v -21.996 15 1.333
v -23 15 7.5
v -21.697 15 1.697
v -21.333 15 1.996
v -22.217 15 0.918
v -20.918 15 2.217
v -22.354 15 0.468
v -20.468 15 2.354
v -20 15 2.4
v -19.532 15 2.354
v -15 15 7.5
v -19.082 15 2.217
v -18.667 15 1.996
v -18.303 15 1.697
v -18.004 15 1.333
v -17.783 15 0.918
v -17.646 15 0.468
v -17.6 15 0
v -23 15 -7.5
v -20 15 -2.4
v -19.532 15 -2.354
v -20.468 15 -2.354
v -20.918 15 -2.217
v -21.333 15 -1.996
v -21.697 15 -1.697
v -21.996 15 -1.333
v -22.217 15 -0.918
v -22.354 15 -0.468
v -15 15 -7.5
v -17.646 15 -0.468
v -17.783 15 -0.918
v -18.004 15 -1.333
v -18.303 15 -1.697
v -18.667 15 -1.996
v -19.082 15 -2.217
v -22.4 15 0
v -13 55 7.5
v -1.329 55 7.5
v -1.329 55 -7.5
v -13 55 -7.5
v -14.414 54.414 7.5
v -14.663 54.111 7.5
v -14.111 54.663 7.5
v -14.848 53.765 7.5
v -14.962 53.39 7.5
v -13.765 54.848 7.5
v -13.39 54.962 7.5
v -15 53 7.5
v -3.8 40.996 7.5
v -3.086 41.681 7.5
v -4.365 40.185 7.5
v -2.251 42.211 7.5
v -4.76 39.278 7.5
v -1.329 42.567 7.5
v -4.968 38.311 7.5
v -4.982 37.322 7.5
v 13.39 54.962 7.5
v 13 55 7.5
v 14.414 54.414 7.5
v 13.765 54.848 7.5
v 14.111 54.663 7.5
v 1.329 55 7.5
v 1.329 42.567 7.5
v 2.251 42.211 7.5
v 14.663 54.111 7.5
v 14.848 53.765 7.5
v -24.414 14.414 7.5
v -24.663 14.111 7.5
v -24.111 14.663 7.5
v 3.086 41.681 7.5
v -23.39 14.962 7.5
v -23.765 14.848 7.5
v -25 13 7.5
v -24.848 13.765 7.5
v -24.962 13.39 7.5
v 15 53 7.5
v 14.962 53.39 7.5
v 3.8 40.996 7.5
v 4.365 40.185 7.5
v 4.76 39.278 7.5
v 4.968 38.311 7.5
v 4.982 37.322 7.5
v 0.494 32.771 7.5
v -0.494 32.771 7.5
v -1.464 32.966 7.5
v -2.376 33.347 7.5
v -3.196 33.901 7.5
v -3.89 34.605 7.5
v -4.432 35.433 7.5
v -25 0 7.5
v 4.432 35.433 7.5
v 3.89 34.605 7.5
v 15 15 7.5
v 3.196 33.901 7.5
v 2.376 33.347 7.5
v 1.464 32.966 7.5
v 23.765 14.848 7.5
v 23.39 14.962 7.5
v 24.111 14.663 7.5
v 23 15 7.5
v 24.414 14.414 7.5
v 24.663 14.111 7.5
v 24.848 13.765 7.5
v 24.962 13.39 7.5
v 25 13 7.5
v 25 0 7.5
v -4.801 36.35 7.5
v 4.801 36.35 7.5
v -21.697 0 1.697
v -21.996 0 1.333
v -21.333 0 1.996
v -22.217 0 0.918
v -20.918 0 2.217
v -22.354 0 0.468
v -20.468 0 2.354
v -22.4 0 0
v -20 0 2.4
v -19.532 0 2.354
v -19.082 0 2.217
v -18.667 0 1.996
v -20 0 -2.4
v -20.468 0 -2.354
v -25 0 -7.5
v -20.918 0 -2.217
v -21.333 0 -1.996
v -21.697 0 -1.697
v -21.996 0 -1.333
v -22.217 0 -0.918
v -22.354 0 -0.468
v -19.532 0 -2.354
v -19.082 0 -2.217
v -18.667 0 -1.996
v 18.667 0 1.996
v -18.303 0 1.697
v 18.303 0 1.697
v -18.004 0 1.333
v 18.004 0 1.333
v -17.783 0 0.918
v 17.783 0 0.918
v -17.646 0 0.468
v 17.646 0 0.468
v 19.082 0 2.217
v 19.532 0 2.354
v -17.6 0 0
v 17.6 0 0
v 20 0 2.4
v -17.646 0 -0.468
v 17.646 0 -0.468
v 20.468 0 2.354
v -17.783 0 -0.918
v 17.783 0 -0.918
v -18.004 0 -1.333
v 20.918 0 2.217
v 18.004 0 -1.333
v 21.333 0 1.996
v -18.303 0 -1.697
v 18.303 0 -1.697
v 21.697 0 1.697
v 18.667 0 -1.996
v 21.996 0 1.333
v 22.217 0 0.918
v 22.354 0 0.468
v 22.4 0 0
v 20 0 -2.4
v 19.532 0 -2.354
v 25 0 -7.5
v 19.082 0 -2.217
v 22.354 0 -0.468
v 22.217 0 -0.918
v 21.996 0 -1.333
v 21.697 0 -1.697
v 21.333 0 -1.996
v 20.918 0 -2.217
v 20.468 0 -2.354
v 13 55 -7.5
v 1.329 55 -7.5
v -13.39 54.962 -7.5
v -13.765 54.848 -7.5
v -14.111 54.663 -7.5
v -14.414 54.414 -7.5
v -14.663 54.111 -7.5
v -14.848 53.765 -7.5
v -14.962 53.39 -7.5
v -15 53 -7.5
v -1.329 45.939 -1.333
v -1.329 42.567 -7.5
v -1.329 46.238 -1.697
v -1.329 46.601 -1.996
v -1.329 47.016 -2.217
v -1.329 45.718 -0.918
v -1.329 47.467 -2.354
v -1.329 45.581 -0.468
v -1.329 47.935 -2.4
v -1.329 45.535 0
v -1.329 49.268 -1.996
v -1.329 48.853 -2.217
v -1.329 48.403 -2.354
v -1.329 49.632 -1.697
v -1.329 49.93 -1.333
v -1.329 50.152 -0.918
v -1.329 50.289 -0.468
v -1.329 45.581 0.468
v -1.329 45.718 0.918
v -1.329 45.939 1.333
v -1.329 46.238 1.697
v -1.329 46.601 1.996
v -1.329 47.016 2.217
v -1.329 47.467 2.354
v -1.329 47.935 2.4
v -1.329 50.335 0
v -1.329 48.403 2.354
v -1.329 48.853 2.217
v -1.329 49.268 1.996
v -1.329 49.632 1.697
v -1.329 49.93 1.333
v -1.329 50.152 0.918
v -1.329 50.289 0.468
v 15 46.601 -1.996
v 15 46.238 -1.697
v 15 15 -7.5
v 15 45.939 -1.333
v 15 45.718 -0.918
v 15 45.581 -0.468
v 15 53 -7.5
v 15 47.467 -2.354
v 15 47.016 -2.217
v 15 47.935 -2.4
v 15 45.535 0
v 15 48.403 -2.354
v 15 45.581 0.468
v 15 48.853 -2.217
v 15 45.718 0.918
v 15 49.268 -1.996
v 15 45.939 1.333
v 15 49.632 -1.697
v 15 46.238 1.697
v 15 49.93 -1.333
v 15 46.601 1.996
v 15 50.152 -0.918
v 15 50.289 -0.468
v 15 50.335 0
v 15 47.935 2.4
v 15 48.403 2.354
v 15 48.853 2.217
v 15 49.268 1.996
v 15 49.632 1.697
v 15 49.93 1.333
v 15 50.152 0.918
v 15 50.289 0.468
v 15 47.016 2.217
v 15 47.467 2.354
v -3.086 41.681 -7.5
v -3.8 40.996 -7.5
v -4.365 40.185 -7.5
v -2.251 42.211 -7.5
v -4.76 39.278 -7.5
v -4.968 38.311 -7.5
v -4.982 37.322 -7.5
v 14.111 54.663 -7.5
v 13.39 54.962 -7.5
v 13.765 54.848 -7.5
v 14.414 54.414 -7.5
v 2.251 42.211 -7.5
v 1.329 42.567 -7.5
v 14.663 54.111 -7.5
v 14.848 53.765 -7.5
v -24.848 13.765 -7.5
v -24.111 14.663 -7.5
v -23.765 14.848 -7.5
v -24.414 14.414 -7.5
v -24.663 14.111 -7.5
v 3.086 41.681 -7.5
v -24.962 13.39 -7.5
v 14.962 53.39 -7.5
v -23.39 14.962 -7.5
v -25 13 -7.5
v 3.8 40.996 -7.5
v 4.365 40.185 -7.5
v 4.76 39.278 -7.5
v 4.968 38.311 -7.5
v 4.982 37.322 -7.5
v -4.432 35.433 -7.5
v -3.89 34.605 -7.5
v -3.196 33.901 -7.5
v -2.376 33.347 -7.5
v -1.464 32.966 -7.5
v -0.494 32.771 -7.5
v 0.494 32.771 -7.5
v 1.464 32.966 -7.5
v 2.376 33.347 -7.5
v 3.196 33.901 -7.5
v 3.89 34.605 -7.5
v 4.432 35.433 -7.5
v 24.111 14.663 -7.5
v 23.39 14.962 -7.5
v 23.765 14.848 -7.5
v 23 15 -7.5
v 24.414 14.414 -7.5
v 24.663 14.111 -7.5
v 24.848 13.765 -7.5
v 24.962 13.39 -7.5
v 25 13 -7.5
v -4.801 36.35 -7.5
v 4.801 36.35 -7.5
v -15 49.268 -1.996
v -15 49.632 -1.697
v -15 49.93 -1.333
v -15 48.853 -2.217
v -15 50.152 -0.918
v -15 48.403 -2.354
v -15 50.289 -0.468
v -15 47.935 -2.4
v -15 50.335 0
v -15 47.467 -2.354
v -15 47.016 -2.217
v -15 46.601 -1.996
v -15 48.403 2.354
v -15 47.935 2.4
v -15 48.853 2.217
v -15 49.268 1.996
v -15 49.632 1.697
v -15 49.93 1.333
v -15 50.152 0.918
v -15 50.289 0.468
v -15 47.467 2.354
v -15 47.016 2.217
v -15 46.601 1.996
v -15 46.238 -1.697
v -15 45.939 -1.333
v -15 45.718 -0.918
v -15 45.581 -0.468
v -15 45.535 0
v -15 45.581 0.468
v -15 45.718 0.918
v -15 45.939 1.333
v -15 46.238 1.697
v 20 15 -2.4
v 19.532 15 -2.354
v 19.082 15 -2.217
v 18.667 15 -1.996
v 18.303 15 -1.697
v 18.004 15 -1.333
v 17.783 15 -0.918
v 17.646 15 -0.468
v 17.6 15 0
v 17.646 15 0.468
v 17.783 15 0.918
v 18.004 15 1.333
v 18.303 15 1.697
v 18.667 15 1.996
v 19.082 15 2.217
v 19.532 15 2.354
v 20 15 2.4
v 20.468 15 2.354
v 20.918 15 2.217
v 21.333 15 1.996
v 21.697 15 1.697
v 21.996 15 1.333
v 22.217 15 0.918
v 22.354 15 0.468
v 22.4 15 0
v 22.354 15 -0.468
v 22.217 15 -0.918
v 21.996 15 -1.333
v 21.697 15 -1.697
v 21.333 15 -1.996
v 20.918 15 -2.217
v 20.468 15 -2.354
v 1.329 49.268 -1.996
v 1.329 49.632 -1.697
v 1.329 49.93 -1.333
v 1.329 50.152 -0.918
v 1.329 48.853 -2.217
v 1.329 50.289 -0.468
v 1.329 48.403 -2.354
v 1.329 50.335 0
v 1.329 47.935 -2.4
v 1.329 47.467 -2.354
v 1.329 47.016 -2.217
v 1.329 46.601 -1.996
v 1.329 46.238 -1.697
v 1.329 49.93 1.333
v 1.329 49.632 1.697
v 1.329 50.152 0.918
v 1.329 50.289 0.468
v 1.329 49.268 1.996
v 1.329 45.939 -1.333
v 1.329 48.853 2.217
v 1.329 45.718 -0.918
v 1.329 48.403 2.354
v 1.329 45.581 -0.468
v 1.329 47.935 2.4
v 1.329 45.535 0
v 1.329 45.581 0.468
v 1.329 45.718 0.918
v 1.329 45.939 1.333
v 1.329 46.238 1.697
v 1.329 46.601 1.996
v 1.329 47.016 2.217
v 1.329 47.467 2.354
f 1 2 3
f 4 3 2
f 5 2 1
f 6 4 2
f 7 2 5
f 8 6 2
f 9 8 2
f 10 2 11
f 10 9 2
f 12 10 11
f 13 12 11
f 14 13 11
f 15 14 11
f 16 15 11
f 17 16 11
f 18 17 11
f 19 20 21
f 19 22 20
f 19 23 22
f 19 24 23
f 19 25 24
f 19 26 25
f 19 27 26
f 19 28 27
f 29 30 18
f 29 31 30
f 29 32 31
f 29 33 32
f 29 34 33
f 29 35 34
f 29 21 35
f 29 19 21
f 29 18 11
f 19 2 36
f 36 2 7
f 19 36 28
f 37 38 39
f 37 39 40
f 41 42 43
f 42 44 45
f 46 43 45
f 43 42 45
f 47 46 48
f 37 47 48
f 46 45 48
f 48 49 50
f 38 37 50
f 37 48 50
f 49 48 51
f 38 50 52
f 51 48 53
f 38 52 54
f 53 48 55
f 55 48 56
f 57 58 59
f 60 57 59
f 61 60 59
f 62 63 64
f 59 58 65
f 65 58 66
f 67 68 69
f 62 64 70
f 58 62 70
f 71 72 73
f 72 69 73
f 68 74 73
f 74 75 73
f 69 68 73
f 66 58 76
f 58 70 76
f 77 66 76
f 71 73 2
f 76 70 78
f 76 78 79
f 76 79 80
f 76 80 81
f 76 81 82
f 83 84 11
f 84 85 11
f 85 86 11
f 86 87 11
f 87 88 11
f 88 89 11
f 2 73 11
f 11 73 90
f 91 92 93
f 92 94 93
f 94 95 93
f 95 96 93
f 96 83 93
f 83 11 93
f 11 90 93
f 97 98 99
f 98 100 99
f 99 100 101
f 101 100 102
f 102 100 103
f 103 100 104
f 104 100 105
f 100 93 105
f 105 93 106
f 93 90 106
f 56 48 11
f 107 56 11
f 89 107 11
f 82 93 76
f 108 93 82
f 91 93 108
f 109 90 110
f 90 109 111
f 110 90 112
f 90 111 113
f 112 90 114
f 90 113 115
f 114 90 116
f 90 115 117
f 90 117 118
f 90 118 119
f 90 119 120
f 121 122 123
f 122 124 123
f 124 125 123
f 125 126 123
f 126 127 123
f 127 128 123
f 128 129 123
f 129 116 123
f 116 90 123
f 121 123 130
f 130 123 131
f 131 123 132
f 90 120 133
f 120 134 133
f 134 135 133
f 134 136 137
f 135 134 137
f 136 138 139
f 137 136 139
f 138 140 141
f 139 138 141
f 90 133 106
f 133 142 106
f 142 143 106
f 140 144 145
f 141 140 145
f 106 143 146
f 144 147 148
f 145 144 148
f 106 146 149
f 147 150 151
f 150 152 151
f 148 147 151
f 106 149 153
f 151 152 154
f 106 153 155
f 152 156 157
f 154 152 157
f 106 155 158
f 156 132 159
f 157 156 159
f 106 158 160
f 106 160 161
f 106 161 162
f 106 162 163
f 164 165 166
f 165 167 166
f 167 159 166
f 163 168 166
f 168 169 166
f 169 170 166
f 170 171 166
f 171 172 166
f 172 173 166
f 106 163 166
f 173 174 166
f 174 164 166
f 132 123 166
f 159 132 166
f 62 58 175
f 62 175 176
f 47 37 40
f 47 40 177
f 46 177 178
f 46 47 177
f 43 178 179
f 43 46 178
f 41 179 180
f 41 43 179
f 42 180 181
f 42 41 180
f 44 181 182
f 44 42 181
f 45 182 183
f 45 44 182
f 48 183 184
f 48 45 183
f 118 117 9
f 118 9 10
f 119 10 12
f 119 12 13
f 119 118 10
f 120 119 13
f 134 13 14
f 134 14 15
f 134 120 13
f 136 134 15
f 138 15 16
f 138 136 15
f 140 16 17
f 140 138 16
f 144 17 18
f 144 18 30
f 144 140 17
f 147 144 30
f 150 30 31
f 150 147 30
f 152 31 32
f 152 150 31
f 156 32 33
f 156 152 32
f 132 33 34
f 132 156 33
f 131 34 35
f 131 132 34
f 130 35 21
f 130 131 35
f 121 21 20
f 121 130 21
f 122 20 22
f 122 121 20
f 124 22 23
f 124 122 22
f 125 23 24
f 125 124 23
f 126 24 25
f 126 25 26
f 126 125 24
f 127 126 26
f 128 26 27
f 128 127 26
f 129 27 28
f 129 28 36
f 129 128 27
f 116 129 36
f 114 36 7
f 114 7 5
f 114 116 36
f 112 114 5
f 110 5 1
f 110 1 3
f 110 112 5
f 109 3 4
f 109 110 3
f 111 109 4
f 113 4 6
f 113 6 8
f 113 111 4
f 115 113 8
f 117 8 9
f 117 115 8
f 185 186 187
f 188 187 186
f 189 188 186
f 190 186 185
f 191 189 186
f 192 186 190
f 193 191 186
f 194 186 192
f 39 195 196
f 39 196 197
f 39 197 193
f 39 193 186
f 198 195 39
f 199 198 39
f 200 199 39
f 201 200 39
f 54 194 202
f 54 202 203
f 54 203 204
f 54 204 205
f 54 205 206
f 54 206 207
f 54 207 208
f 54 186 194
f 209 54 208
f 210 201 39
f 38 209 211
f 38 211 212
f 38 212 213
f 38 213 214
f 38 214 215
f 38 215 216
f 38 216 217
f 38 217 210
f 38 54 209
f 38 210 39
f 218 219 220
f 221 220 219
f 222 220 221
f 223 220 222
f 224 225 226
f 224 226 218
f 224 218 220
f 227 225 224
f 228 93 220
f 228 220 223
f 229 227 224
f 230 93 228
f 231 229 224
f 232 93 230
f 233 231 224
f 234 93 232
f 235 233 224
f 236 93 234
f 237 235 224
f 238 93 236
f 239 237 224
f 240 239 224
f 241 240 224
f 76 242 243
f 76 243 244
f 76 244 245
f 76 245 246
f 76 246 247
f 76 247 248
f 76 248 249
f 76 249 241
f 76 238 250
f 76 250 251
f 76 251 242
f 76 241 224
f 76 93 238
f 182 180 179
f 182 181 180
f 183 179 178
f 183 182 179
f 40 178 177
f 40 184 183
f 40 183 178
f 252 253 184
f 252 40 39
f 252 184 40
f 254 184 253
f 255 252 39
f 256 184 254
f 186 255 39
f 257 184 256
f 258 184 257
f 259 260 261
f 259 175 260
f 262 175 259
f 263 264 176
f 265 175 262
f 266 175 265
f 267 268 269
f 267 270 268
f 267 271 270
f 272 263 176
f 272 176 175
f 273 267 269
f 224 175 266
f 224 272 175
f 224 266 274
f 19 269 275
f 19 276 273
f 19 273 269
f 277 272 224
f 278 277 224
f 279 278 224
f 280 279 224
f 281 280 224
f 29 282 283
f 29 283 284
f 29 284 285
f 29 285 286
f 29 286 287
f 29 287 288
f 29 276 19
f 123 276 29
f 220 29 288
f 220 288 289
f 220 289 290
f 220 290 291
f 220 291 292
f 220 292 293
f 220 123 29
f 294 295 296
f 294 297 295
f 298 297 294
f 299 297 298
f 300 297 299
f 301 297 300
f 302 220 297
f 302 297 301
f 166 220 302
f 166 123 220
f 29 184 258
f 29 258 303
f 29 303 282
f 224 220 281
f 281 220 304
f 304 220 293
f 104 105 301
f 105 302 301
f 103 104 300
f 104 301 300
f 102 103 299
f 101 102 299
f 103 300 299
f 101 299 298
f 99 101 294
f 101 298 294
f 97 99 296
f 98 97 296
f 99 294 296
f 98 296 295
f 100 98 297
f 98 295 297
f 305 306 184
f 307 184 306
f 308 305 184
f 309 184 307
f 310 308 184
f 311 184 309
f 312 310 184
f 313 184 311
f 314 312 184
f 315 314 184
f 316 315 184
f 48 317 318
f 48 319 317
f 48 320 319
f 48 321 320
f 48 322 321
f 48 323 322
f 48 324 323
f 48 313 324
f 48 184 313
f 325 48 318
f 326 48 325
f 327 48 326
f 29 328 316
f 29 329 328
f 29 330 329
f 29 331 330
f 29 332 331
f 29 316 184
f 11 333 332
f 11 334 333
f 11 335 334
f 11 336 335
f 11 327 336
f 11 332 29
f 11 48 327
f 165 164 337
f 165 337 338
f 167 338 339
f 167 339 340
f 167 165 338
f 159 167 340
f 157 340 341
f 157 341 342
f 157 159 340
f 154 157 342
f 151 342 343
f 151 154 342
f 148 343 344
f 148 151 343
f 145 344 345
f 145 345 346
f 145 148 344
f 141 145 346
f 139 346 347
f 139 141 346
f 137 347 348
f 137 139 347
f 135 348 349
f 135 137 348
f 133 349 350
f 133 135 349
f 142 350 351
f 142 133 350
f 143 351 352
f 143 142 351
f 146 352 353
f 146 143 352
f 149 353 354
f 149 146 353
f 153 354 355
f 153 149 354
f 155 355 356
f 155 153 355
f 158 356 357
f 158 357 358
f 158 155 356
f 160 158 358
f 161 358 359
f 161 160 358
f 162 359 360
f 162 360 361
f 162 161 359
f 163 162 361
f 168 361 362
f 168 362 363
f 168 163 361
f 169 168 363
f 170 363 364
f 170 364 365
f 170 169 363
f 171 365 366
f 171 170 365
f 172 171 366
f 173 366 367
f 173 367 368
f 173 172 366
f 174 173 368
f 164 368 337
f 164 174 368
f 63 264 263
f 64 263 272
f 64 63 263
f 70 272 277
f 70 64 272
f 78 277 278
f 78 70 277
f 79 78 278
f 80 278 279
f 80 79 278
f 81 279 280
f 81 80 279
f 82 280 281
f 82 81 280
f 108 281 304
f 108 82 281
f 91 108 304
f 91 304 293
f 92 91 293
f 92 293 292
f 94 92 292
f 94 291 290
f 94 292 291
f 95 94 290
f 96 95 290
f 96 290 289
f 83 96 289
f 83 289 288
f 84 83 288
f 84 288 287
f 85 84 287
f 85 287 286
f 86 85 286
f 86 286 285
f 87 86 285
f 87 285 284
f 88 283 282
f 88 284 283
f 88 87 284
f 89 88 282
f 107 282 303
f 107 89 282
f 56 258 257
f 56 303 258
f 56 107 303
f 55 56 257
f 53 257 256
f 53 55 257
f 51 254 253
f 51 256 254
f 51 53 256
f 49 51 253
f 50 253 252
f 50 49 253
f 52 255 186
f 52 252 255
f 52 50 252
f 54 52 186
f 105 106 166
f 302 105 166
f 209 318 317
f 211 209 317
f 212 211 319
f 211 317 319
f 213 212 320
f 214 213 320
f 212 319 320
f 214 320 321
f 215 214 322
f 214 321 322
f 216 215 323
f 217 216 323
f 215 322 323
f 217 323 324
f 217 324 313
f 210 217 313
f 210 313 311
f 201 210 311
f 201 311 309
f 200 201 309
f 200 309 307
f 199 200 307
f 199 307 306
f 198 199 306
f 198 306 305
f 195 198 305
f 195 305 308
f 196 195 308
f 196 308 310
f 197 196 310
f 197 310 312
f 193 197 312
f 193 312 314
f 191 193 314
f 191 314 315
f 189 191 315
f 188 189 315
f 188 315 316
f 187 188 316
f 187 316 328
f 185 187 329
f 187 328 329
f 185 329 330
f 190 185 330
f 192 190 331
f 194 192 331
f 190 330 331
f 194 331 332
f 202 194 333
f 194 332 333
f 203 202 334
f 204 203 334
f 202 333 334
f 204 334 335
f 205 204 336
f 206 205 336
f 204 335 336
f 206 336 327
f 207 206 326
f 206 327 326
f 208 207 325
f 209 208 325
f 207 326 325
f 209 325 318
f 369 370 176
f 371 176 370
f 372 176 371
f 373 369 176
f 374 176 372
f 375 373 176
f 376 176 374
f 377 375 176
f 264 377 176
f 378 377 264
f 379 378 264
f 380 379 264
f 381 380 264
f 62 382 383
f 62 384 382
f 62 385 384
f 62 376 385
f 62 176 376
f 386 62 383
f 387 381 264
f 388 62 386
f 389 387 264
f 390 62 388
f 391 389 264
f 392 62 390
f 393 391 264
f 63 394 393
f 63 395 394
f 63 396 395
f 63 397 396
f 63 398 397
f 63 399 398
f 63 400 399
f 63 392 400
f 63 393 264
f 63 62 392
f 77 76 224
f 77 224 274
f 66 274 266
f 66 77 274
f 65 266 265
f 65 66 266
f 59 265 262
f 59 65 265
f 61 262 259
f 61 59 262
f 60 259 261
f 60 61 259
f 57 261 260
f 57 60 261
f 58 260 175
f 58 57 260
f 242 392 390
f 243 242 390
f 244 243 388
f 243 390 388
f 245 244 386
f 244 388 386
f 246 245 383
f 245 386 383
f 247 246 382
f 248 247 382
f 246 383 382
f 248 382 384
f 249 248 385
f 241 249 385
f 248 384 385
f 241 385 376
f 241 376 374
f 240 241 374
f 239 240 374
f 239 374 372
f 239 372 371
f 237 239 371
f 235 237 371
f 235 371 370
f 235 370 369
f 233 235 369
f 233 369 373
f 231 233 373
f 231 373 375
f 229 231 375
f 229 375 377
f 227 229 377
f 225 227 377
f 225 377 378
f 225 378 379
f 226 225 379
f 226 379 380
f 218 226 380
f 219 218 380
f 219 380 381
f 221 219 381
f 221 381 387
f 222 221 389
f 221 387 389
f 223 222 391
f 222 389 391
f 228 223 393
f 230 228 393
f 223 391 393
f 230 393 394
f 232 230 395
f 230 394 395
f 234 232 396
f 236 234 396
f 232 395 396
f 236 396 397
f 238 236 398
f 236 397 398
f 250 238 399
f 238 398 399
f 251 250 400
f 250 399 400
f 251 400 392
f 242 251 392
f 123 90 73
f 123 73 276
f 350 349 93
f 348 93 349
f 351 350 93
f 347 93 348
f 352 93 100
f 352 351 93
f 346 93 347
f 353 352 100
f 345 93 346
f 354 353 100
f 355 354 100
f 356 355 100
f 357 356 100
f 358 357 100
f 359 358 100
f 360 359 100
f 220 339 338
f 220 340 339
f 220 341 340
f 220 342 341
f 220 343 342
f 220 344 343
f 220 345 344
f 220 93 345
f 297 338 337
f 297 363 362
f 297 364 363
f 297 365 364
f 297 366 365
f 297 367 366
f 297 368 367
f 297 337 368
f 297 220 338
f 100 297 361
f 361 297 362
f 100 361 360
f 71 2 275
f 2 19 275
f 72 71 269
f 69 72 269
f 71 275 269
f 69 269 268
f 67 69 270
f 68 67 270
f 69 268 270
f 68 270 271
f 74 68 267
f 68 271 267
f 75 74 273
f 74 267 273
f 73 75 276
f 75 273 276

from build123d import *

# Parameters (mm, degrees)
SKETCH1_W                       = 50
SKETCH1_H                       = 15
SKETCH1_R                       = 2.4
BOSS_EXTRUDE1_DEPTH             = 15
BOSS_EXTRUDE2_REACH             = 32.104
BOSS_EXTRUDE2_DIRECTION_2_REACH = 32.104
FILLET1_R                       = 2
SKETCH4_R                       = 2.4
CUT_EXTRUDE1_DEPTH              = 69.419660917


with BuildPart() as part:
    # Sketch1 → Boss-Extrude1 (new body)
    with BuildSketch(Plane(origin=(0, 0, 0), x_dir=(1, 0, 0), z_dir=(0, 1, 0))):
        Rectangle(SKETCH1_W, SKETCH1_H)
        with Locations((-20, 0)):
            Circle(SKETCH1_R, mode=Mode.SUBTRACT)
        with Locations((20, 0)):
            Circle(SKETCH1_R, mode=Mode.SUBTRACT)
    extrude(amount=BOSS_EXTRUDE1_DEPTH)

    # Boss-Extrude2: up to this face of the body (flat: up to its plane)
    boss_extrude2_end = Plane(part.part.faces().sort_by_distance((0, 7.5, 7.5))[0])
    # Sketch3 → Boss-Extrude2 (add, up to the picked face)
    with BuildSketch(Plane.XY, mode=Mode.PRIVATE) as boss_extrude2_sk1:
        with BuildLine():
            Line((1.328723236, 55), (1.328723236, 42.566882454))
            ThreePointArc((1.328723236, 42.566882454), (0, 32.746665181), (-1.328723236, 42.566882454))
            Line((-1.328723236, 42.566882454), (-1.328723236, 55))
            Line((-1.328723236, 55), (-3.865793159, 55))
            Line((-3.865793159, 55), (-13, 55))
            ThreePointArc((-13, 55), (-14.414213562, 54.414213562), (-15, 53))
            Line((-15, 53), (-15, 15))
            Line((-15, 15), (15, 15))
            Line((15, 15), (15, 53))
            ThreePointArc((15, 53), (14.414213562, 54.414213562), (13, 55))
            Line((13, 55), (3.865793159, 55))
            Line((3.865793159, 55), (1.328723236, 55))
        make_face()
    boss_extrude2_tool1 = split(extrude(boss_extrude2_sk1.sketch, amount=BOSS_EXTRUDE2_REACH, mode=Mode.PRIVATE), bisect_by=boss_extrude2_end, keep=Keep.BOTH, mode=Mode.PRIVATE)
    add(boss_extrude2_tool1.solids().sort_by(Axis((14.06066, 54.06066, 0), (0, 0, 1)))[0])

    # Boss-Extrude2 direction 2: up to this face of the body (flat: up to its plane)
    boss_extrude2_direction_2_end = Plane(part.part.faces().sort_by_distance((0, 7.5, -7.5))[0])
    # Sketch3 → Boss-Extrude2 direction 2 (add, up to the picked face)
    with BuildSketch(Plane.XY, mode=Mode.PRIVATE) as boss_extrude2_direction_2_sk1:
        with BuildLine():
            Line((1.328723236, 55), (1.328723236, 42.566882454))
            ThreePointArc((1.328723236, 42.566882454), (0, 32.746665181), (-1.328723236, 42.566882454))
            Line((-1.328723236, 42.566882454), (-1.328723236, 55))
            Line((-1.328723236, 55), (-3.865793159, 55))
            Line((-3.865793159, 55), (-13, 55))
            ThreePointArc((-13, 55), (-14.414213562, 54.414213562), (-15, 53))
            Line((-15, 53), (-15, 15))
            Line((-15, 15), (15, 15))
            Line((15, 15), (15, 53))
            ThreePointArc((15, 53), (14.414213562, 54.414213562), (13, 55))
            Line((13, 55), (3.865793159, 55))
            Line((3.865793159, 55), (1.328723236, 55))
        make_face()
    boss_extrude2_direction_2_tool1 = split(extrude(boss_extrude2_direction_2_sk1.sketch, amount=-BOSS_EXTRUDE2_DIRECTION_2_REACH, mode=Mode.PRIVATE), bisect_by=boss_extrude2_direction_2_end, keep=Keep.BOTH, mode=Mode.PRIVATE)
    add(boss_extrude2_direction_2_tool1.solids().sort_by(Axis((14.06066, 54.06066, 0), (0, 0, -1)))[0])

    # Fillet1
    fillet1_edges = [part.edges().sort_by_distance(p)[0] for p in [
        (-25, 15, 0),
        (25, 15, 0),
    ]]
    fillet(fillet1_edges, radius=FILLET1_R)

    # Sketch4 → Cut-Extrude1 (cut, through all)
    with BuildSketch(Plane.ZY.offset(15)):
        with Locations((0, 47.934840873)):
            Circle(SKETCH4_R)
    extrude(amount=-CUT_EXTRUDE1_DEPTH, mode=Mode.SUBTRACT)


solid = part.part
